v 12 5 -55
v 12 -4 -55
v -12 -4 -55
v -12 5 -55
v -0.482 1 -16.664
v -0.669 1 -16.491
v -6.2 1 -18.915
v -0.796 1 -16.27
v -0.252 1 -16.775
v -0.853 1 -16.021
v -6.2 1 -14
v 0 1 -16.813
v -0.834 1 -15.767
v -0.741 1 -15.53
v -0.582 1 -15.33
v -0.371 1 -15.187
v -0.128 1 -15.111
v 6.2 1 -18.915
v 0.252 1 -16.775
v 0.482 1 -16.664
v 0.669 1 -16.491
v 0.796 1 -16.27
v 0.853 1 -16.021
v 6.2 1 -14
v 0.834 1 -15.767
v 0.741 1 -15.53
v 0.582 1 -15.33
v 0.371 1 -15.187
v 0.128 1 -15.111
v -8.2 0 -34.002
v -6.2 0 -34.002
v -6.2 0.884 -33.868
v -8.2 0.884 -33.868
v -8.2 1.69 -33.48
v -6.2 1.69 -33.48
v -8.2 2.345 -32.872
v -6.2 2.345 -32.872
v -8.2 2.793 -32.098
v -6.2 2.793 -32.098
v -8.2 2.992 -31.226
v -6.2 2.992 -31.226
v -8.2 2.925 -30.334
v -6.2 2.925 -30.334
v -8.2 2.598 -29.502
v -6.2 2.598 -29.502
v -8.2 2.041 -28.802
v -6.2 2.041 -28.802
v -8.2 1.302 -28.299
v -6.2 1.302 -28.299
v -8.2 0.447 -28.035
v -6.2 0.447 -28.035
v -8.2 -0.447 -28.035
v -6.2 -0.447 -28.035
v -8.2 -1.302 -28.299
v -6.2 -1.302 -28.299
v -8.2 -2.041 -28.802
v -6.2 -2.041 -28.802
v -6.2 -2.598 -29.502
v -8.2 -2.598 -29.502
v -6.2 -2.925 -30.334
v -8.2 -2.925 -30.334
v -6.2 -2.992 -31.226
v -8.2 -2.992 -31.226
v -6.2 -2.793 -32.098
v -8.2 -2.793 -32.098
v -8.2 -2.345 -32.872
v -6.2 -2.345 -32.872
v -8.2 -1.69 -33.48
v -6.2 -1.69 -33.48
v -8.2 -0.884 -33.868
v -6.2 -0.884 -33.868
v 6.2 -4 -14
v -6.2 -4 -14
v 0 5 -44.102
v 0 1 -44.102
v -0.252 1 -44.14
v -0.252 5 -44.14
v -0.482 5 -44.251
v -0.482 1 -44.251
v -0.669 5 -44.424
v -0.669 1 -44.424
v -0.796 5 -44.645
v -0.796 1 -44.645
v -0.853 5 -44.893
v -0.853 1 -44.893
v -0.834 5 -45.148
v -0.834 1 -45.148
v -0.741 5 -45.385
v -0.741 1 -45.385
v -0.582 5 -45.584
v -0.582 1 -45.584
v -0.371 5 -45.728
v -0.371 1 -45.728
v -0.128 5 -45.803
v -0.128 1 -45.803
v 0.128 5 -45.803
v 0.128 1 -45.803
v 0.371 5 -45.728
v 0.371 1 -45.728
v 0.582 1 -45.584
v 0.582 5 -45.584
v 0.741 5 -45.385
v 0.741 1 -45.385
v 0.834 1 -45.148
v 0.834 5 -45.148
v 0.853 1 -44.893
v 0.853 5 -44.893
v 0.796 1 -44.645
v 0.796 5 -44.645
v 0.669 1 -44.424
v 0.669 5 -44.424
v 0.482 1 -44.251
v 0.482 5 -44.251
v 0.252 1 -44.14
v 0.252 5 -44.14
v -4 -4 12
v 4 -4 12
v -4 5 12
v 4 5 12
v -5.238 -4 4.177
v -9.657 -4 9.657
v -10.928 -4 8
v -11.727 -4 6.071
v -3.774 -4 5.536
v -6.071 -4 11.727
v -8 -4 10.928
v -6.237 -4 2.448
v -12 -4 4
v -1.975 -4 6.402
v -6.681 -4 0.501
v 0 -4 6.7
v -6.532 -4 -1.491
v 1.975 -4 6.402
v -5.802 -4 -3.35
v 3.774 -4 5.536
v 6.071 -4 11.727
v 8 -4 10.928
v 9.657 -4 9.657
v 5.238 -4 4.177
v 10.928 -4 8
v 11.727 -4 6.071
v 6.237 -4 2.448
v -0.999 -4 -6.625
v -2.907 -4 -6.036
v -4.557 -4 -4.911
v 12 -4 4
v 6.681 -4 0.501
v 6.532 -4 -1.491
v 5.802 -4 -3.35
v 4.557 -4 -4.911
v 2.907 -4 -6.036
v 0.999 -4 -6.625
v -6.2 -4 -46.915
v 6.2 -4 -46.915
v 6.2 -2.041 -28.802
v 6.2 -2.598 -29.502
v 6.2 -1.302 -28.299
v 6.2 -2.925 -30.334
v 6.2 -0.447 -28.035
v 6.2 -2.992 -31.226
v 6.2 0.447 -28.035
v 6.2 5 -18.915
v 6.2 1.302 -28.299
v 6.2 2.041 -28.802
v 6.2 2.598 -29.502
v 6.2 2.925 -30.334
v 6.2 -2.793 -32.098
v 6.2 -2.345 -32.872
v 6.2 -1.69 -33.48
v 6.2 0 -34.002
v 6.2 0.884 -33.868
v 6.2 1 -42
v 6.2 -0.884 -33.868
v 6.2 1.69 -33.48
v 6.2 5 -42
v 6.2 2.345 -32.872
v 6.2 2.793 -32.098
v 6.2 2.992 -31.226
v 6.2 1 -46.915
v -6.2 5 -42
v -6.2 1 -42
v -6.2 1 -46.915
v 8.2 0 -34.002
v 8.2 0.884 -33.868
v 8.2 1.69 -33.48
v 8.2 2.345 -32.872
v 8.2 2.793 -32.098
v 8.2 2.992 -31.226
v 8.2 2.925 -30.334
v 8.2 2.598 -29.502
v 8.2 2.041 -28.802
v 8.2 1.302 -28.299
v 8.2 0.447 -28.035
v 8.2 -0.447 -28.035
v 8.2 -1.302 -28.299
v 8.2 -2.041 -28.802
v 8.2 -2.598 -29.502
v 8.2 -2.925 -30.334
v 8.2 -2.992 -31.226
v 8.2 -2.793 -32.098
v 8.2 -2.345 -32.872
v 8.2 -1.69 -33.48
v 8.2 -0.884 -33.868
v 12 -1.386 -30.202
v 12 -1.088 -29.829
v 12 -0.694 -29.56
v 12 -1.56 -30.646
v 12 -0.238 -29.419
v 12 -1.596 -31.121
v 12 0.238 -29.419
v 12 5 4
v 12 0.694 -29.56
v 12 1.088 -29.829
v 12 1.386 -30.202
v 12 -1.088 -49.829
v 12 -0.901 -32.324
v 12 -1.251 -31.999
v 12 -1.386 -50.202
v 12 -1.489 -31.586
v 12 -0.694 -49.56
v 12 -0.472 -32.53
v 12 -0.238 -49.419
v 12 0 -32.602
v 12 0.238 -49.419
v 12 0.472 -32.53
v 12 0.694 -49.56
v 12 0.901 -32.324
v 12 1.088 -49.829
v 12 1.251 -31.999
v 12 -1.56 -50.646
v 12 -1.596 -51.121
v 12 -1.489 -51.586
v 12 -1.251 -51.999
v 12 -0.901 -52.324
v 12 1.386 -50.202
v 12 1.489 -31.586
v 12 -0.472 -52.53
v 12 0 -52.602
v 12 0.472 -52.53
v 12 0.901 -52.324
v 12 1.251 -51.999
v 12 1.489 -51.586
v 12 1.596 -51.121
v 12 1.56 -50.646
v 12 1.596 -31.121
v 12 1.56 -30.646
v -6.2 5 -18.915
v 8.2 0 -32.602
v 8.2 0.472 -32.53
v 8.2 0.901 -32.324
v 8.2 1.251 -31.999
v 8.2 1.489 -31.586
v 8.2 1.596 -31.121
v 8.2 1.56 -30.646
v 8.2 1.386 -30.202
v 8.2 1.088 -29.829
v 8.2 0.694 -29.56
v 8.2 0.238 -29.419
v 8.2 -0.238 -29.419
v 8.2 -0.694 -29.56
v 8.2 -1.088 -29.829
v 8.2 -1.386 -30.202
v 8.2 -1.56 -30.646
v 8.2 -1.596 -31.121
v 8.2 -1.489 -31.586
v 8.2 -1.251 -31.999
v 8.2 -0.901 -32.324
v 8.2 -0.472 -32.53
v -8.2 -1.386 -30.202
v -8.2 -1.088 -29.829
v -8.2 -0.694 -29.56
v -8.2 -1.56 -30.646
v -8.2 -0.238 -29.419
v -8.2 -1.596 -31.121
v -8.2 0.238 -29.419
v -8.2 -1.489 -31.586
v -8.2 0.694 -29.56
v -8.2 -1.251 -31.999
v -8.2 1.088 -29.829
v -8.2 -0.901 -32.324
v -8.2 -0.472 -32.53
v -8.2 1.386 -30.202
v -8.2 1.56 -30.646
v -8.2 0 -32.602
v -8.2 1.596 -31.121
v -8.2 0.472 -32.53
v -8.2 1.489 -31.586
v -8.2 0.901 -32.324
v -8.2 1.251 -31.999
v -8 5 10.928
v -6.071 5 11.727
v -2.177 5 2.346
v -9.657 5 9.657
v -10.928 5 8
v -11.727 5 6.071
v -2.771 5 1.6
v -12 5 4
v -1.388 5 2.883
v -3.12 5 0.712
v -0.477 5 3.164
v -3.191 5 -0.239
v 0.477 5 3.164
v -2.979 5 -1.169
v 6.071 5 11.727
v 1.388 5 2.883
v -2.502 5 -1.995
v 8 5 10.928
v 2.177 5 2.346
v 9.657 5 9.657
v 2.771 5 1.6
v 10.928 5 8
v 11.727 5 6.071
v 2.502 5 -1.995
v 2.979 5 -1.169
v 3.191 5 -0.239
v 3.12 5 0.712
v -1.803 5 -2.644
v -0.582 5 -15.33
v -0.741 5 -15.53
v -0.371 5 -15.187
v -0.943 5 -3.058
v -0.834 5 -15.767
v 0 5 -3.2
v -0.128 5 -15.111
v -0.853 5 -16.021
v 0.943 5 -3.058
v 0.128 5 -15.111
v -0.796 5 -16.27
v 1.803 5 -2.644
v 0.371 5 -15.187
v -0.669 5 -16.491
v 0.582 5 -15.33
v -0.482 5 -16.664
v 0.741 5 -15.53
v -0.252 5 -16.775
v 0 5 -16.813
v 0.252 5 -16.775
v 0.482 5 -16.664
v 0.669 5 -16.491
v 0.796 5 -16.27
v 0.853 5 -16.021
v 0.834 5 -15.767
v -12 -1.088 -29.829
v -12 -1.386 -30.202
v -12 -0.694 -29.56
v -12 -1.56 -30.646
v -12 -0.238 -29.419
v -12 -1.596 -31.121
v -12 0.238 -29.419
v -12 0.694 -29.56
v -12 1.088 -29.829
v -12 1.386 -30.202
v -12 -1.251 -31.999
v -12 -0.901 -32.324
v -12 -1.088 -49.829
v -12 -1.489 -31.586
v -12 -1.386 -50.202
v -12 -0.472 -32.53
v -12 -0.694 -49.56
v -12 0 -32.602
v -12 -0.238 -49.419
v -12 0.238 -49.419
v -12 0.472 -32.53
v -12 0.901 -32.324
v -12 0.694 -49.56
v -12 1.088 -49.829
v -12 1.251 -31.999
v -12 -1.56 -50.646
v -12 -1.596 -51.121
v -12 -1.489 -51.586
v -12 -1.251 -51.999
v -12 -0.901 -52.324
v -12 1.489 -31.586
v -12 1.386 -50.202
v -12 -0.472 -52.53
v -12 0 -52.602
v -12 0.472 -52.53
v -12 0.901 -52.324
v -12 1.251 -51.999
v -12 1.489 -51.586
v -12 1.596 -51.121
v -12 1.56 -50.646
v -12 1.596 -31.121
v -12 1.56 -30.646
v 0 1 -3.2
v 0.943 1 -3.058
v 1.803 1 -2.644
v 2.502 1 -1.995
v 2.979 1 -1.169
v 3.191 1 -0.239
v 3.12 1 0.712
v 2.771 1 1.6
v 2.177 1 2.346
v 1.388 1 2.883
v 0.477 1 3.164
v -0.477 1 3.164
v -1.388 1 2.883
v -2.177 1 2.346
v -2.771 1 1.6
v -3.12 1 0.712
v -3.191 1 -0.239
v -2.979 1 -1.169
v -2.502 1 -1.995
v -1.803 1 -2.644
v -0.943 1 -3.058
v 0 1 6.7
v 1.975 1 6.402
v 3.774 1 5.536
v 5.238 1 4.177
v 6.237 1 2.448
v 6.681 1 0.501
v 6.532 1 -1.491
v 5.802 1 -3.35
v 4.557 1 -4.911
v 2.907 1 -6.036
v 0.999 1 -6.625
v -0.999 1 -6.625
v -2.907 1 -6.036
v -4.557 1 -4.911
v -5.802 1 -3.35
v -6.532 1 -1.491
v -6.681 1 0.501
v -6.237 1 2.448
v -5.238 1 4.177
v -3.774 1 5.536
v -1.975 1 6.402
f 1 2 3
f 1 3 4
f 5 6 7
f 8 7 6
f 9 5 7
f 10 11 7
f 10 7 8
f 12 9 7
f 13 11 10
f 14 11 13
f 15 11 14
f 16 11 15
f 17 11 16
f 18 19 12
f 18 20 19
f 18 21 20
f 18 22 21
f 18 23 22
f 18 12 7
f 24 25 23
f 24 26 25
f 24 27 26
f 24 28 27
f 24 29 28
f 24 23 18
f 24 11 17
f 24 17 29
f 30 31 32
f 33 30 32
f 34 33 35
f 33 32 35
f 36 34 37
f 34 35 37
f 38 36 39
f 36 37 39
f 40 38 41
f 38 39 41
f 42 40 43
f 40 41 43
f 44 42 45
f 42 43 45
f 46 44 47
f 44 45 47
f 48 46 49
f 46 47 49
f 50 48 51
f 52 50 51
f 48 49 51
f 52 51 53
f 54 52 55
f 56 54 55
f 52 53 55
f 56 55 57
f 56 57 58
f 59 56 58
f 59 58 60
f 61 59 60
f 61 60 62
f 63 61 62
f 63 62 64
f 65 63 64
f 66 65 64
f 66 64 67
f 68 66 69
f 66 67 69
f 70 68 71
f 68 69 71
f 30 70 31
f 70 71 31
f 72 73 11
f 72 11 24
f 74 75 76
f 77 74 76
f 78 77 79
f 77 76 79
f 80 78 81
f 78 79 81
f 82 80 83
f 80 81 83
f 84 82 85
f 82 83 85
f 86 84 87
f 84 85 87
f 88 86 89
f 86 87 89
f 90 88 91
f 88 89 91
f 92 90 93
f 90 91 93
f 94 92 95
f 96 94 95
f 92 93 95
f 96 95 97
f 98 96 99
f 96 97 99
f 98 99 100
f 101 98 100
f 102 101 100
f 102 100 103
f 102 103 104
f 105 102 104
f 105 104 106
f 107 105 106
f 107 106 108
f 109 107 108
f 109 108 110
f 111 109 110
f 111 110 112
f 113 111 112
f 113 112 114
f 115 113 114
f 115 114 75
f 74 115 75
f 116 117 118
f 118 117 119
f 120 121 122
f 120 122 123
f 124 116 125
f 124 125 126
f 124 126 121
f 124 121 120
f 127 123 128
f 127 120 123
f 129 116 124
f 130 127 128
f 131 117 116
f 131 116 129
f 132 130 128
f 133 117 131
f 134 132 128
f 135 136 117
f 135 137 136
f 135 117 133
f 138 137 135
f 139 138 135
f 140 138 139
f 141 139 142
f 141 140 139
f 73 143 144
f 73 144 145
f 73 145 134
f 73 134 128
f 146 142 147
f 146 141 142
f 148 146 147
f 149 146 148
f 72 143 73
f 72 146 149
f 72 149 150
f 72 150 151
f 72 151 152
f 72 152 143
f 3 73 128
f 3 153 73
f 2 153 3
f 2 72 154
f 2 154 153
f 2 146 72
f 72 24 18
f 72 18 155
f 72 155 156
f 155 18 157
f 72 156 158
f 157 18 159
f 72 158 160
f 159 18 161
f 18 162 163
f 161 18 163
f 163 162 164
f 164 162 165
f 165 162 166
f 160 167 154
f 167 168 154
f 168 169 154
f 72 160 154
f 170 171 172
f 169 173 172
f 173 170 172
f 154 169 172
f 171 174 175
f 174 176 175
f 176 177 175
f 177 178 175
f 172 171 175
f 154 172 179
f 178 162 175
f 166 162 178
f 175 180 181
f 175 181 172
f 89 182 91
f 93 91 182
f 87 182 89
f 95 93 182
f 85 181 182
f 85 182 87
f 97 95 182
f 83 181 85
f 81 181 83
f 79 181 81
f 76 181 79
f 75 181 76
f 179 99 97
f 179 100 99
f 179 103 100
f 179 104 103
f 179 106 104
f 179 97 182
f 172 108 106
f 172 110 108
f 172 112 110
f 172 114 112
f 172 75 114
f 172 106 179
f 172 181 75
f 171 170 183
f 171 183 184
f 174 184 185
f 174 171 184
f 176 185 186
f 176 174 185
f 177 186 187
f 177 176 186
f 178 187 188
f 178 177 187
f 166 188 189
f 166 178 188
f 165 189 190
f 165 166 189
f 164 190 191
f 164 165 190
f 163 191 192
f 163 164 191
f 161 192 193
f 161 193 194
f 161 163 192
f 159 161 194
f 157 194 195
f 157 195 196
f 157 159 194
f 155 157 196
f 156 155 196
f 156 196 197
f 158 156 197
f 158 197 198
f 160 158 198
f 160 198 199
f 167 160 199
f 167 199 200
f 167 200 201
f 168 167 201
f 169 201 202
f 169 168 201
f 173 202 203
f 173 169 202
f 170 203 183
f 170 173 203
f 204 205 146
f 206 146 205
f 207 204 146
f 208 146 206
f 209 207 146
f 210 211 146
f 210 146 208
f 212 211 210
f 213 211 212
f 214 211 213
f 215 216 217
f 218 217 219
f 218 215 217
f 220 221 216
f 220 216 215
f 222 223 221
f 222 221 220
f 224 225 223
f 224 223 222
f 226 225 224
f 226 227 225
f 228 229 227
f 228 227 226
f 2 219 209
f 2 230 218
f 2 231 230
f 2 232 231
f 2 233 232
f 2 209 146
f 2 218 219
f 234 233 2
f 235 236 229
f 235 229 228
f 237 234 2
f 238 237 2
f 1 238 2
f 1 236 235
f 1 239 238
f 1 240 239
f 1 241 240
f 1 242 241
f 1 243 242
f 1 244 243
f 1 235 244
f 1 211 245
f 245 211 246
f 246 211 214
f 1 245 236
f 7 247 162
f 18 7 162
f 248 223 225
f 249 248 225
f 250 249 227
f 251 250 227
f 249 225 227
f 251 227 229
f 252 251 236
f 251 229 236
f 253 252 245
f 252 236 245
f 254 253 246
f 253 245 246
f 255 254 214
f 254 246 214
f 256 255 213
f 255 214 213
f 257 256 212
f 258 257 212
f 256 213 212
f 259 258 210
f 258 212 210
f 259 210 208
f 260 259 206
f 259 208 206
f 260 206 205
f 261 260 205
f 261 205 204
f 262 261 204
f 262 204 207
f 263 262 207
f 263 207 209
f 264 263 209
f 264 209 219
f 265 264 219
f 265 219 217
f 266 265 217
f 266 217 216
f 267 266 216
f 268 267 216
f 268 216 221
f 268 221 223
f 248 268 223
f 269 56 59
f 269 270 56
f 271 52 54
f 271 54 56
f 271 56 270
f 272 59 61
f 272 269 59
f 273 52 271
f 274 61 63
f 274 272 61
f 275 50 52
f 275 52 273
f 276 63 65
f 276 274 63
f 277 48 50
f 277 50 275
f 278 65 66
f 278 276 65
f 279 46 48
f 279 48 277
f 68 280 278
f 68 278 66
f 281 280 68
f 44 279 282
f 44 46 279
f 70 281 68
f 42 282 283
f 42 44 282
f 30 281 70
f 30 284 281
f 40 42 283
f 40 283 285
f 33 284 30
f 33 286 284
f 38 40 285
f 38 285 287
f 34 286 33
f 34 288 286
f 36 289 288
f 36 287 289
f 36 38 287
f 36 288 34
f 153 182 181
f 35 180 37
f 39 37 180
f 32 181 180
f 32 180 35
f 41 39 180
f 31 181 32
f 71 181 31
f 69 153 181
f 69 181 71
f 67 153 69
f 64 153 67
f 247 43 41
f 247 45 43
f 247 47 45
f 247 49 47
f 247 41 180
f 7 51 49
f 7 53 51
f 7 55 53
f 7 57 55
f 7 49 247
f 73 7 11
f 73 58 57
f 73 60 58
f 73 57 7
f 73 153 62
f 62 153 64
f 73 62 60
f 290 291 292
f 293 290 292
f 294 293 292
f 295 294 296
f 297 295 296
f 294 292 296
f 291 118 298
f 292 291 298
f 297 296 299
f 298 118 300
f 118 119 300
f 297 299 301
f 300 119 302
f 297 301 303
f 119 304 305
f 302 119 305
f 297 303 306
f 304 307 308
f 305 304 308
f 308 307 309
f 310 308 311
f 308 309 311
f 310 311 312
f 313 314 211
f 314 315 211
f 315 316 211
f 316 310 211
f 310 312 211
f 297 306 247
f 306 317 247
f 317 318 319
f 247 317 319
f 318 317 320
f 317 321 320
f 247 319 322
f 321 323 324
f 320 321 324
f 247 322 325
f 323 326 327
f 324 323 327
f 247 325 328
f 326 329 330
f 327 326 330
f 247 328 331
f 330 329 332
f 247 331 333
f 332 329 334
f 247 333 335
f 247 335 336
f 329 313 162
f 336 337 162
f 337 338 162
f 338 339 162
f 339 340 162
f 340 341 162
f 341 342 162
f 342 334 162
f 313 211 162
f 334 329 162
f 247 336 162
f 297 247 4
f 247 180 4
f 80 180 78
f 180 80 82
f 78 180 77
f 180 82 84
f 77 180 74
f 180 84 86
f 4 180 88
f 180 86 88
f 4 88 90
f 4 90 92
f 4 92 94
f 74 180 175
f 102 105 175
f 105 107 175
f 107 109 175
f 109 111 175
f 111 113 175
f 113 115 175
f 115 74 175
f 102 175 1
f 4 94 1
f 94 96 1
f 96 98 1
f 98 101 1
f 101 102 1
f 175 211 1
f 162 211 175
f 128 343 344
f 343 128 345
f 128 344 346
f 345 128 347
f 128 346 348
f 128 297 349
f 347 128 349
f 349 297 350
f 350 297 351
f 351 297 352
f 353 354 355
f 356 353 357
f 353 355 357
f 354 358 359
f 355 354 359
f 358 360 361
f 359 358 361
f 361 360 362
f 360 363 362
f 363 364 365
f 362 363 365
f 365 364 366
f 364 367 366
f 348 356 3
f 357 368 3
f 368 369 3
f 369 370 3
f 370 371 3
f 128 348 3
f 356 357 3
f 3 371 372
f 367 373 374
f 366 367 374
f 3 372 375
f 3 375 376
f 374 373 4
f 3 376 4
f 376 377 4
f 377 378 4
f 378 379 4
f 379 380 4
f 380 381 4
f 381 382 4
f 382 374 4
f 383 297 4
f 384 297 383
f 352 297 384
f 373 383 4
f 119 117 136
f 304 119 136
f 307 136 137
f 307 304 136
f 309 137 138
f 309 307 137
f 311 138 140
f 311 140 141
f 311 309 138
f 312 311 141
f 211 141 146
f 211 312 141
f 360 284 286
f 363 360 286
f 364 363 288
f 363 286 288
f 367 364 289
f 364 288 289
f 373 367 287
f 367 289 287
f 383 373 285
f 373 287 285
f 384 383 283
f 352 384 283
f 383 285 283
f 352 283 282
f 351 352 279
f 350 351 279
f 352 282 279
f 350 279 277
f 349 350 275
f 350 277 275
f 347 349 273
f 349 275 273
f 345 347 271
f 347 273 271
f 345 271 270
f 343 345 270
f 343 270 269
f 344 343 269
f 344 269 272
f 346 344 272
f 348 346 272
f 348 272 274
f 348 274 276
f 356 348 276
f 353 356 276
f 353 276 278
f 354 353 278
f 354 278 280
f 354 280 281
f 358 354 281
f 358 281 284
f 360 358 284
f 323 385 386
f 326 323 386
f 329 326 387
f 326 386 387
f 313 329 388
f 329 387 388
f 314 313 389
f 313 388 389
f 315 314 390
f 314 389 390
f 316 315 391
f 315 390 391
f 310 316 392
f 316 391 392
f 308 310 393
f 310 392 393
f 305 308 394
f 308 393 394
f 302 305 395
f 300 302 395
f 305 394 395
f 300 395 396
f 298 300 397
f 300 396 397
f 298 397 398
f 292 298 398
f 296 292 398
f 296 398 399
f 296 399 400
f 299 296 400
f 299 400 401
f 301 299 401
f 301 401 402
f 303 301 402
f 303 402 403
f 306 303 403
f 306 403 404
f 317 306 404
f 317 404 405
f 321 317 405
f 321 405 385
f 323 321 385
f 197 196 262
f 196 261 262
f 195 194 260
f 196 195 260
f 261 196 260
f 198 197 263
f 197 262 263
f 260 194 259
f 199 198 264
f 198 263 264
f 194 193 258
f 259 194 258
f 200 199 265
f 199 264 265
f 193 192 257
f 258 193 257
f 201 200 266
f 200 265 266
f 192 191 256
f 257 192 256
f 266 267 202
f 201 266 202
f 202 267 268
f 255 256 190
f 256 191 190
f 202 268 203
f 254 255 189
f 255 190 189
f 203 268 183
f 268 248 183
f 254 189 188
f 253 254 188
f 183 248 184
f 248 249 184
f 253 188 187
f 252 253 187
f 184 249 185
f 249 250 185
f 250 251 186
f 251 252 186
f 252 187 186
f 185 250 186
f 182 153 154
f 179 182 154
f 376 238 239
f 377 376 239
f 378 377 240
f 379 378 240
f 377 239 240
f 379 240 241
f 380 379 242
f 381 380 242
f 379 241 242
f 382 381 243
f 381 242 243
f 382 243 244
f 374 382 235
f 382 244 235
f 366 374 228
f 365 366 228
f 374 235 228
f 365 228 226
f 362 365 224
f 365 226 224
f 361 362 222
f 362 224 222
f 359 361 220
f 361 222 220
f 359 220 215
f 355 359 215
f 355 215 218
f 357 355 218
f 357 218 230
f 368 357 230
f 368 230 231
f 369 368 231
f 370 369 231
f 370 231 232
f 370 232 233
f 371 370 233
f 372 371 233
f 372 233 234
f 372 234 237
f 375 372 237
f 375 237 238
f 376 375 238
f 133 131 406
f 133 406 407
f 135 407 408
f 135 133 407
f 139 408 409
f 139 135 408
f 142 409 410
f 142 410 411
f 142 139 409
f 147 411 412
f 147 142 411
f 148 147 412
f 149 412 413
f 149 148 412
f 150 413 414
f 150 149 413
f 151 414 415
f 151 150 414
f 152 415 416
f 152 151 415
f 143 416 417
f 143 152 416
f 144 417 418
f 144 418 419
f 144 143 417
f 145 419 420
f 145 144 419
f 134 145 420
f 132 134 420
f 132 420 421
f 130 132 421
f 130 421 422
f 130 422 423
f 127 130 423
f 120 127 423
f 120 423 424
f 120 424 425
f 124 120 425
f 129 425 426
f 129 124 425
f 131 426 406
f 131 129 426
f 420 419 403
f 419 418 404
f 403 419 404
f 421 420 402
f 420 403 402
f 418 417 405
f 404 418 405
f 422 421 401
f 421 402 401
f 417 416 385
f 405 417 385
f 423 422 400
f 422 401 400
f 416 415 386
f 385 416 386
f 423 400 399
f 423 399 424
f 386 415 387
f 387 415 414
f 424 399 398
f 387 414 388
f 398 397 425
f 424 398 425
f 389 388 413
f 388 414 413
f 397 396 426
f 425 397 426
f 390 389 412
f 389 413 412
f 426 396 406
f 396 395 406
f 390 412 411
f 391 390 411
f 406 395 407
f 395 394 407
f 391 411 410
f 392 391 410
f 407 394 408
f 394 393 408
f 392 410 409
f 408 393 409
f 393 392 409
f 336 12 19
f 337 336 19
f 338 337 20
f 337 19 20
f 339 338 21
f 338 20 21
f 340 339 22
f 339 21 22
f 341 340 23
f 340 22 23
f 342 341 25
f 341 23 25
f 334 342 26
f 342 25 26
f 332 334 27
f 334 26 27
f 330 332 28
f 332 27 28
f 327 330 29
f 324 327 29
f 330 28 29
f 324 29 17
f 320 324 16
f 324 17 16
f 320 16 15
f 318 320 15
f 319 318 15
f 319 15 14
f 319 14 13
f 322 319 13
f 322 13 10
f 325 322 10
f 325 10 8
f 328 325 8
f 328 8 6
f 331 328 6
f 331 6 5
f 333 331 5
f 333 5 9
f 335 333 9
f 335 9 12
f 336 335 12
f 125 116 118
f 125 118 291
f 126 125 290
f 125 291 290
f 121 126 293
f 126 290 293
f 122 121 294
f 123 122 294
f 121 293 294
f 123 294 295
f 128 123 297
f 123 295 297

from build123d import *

# Parameters (mm, degrees)
SKETCH_1_W          = 67
SKETCH_1_H          = 9
EXTRUDE_1_DEPTH     = 12
SKETCH_2_R          = 6.7
CUT_EXTRUDE_1_DEPTH = 5
SKETCH_4_R          = 3.2
CUT_EXTRUDE_3_DEPTH = 57.515484604
SKETCH_3_W          = 12.4
SKETCH_3_H          = 23.085257288
CUT_EXTRUDE_2_DEPTH = 58.008771255
SKETCH_5_W          = 12.4
SKETCH_5_H          = 32.914742712
CUT_EXTRUDE_4_DEPTH = 5
SKETCH_6_R          = 0.855484329
CUT_EXTRUDE_5_DEPTH = 57.515484604
FILLET_1_R          = 8
SKETCH_7_R          = 1.6
CUT_EXTRUDE_6_DEPTH = 61.216276869
SKETCH_8_R          = 3
CUT_EXTRUDE_7_DEPTH = 2


with BuildPart() as part:
    # 草图1 → 凸台-拉伸1 (new, symmetric)
    with BuildSketch(Plane(origin=(0, 0, 0), x_dir=(0, 0, -1), z_dir=(1, 0, 0))):
        with Locations((21.5, 0.5)):
            Rectangle(SKETCH_1_W, SKETCH_1_H)
    extrude(amount=EXTRUDE_1_DEPTH, both=True)

    # 草图2 → 切除-拉伸1 (cut)
    with BuildSketch(Plane(origin=(0, -4, 0), x_dir=(1, 0, 0), z_dir=(0, 1, 0))):
        with Locations(Location((0, 0, 0), (0, 0, 270))):
            Circle(SKETCH_2_R)
    extrude(amount=CUT_EXTRUDE_1_DEPTH, mode=Mode.SUBTRACT)

    # 草图4 → 切除-拉伸3 (cut, through all)
    with BuildSketch(Plane.XZ.offset(-1)):
        with Locations(Location((0, 0, 0), (0, 0, 270))):
            Circle(SKETCH_4_R)
    extrude(amount=-CUT_EXTRUDE_3_DEPTH, mode=Mode.SUBTRACT)

    # 草图3 → 切除-拉伸2 (cut, through all)
    with BuildSketch(Plane(origin=(0, 5, 0), x_dir=(1, 0, 0), z_dir=(0, 1, 0))):
        with Locations((0, 30.457371356)):
            Rectangle(SKETCH_3_W, SKETCH_3_H)
    extrude(amount=-CUT_EXTRUDE_2_DEPTH, mode=Mode.SUBTRACT)

    # 草图5 → 切除-拉伸4 (cut)
    with BuildSketch(Plane.XZ.offset(4)):
        with Locations((0, -30.457371356)):
            Rectangle(SKETCH_5_W, SKETCH_5_H)
    extrude(amount=-CUT_EXTRUDE_4_DEPTH, mode=Mode.SUBTRACT)

    # 草图6 → 切除-拉伸5 (cut, through all)
    with BuildSketch(Plane.XZ.offset(-1)):
        with Locations(Location((0, -15.957371356, 0), (0, 0, 270))):
            Circle(SKETCH_6_R)
        with Locations(Location((0, -44.957371356, 0), (0, 0, 90))):
            Circle(SKETCH_6_R)
    extrude(amount=-CUT_EXTRUDE_5_DEPTH, mode=Mode.SUBTRACT)

    # 圆角1
    fillet_1_edges = [part.edges().sort_by_distance(p)[0] for p in [
        (12, 0.5, 12),
        (-12, 0.5, 12),
    ]]
    fillet(fillet_1_edges, radius=FILLET_1_R)

    # 草图7 → 切除-拉伸6 (cut, through all)
    with BuildSketch(Plane(origin=(12, 0, 0), x_dir=(0, 0, -1), z_dir=(1, 0, 0))):
        with Locations((51.001572261, 0)):
            Circle(SKETCH_7_R)
        with Locations((31.001572261, 0)):
            Circle(SKETCH_7_R)
    extrude(amount=-CUT_EXTRUDE_6_DEPTH, mode=Mode.SUBTRACT)

    # 草图8 → 切除-拉伸7 (cut)
    with BuildSketch(Plane(origin=(-6.2, 0, 0), x_dir=(0, 0, -1), z_dir=(1, 0, 0))):
        with Locations((31.001572261, 0)):
            Circle(SKETCH_8_R)
    cut_extrude_7 = extrude(amount=-CUT_EXTRUDE_7_DEPTH, mode=Mode.SUBTRACT)

    # 镜向1: 切除-拉伸7 across plane
    add(cut_extrude_7.mirror(Plane(origin=(0, 0, 0), x_dir=(0, 0, 1), z_dir=(1, 0, 0))), mode=Mode.SUBTRACT)


solid = part.part
